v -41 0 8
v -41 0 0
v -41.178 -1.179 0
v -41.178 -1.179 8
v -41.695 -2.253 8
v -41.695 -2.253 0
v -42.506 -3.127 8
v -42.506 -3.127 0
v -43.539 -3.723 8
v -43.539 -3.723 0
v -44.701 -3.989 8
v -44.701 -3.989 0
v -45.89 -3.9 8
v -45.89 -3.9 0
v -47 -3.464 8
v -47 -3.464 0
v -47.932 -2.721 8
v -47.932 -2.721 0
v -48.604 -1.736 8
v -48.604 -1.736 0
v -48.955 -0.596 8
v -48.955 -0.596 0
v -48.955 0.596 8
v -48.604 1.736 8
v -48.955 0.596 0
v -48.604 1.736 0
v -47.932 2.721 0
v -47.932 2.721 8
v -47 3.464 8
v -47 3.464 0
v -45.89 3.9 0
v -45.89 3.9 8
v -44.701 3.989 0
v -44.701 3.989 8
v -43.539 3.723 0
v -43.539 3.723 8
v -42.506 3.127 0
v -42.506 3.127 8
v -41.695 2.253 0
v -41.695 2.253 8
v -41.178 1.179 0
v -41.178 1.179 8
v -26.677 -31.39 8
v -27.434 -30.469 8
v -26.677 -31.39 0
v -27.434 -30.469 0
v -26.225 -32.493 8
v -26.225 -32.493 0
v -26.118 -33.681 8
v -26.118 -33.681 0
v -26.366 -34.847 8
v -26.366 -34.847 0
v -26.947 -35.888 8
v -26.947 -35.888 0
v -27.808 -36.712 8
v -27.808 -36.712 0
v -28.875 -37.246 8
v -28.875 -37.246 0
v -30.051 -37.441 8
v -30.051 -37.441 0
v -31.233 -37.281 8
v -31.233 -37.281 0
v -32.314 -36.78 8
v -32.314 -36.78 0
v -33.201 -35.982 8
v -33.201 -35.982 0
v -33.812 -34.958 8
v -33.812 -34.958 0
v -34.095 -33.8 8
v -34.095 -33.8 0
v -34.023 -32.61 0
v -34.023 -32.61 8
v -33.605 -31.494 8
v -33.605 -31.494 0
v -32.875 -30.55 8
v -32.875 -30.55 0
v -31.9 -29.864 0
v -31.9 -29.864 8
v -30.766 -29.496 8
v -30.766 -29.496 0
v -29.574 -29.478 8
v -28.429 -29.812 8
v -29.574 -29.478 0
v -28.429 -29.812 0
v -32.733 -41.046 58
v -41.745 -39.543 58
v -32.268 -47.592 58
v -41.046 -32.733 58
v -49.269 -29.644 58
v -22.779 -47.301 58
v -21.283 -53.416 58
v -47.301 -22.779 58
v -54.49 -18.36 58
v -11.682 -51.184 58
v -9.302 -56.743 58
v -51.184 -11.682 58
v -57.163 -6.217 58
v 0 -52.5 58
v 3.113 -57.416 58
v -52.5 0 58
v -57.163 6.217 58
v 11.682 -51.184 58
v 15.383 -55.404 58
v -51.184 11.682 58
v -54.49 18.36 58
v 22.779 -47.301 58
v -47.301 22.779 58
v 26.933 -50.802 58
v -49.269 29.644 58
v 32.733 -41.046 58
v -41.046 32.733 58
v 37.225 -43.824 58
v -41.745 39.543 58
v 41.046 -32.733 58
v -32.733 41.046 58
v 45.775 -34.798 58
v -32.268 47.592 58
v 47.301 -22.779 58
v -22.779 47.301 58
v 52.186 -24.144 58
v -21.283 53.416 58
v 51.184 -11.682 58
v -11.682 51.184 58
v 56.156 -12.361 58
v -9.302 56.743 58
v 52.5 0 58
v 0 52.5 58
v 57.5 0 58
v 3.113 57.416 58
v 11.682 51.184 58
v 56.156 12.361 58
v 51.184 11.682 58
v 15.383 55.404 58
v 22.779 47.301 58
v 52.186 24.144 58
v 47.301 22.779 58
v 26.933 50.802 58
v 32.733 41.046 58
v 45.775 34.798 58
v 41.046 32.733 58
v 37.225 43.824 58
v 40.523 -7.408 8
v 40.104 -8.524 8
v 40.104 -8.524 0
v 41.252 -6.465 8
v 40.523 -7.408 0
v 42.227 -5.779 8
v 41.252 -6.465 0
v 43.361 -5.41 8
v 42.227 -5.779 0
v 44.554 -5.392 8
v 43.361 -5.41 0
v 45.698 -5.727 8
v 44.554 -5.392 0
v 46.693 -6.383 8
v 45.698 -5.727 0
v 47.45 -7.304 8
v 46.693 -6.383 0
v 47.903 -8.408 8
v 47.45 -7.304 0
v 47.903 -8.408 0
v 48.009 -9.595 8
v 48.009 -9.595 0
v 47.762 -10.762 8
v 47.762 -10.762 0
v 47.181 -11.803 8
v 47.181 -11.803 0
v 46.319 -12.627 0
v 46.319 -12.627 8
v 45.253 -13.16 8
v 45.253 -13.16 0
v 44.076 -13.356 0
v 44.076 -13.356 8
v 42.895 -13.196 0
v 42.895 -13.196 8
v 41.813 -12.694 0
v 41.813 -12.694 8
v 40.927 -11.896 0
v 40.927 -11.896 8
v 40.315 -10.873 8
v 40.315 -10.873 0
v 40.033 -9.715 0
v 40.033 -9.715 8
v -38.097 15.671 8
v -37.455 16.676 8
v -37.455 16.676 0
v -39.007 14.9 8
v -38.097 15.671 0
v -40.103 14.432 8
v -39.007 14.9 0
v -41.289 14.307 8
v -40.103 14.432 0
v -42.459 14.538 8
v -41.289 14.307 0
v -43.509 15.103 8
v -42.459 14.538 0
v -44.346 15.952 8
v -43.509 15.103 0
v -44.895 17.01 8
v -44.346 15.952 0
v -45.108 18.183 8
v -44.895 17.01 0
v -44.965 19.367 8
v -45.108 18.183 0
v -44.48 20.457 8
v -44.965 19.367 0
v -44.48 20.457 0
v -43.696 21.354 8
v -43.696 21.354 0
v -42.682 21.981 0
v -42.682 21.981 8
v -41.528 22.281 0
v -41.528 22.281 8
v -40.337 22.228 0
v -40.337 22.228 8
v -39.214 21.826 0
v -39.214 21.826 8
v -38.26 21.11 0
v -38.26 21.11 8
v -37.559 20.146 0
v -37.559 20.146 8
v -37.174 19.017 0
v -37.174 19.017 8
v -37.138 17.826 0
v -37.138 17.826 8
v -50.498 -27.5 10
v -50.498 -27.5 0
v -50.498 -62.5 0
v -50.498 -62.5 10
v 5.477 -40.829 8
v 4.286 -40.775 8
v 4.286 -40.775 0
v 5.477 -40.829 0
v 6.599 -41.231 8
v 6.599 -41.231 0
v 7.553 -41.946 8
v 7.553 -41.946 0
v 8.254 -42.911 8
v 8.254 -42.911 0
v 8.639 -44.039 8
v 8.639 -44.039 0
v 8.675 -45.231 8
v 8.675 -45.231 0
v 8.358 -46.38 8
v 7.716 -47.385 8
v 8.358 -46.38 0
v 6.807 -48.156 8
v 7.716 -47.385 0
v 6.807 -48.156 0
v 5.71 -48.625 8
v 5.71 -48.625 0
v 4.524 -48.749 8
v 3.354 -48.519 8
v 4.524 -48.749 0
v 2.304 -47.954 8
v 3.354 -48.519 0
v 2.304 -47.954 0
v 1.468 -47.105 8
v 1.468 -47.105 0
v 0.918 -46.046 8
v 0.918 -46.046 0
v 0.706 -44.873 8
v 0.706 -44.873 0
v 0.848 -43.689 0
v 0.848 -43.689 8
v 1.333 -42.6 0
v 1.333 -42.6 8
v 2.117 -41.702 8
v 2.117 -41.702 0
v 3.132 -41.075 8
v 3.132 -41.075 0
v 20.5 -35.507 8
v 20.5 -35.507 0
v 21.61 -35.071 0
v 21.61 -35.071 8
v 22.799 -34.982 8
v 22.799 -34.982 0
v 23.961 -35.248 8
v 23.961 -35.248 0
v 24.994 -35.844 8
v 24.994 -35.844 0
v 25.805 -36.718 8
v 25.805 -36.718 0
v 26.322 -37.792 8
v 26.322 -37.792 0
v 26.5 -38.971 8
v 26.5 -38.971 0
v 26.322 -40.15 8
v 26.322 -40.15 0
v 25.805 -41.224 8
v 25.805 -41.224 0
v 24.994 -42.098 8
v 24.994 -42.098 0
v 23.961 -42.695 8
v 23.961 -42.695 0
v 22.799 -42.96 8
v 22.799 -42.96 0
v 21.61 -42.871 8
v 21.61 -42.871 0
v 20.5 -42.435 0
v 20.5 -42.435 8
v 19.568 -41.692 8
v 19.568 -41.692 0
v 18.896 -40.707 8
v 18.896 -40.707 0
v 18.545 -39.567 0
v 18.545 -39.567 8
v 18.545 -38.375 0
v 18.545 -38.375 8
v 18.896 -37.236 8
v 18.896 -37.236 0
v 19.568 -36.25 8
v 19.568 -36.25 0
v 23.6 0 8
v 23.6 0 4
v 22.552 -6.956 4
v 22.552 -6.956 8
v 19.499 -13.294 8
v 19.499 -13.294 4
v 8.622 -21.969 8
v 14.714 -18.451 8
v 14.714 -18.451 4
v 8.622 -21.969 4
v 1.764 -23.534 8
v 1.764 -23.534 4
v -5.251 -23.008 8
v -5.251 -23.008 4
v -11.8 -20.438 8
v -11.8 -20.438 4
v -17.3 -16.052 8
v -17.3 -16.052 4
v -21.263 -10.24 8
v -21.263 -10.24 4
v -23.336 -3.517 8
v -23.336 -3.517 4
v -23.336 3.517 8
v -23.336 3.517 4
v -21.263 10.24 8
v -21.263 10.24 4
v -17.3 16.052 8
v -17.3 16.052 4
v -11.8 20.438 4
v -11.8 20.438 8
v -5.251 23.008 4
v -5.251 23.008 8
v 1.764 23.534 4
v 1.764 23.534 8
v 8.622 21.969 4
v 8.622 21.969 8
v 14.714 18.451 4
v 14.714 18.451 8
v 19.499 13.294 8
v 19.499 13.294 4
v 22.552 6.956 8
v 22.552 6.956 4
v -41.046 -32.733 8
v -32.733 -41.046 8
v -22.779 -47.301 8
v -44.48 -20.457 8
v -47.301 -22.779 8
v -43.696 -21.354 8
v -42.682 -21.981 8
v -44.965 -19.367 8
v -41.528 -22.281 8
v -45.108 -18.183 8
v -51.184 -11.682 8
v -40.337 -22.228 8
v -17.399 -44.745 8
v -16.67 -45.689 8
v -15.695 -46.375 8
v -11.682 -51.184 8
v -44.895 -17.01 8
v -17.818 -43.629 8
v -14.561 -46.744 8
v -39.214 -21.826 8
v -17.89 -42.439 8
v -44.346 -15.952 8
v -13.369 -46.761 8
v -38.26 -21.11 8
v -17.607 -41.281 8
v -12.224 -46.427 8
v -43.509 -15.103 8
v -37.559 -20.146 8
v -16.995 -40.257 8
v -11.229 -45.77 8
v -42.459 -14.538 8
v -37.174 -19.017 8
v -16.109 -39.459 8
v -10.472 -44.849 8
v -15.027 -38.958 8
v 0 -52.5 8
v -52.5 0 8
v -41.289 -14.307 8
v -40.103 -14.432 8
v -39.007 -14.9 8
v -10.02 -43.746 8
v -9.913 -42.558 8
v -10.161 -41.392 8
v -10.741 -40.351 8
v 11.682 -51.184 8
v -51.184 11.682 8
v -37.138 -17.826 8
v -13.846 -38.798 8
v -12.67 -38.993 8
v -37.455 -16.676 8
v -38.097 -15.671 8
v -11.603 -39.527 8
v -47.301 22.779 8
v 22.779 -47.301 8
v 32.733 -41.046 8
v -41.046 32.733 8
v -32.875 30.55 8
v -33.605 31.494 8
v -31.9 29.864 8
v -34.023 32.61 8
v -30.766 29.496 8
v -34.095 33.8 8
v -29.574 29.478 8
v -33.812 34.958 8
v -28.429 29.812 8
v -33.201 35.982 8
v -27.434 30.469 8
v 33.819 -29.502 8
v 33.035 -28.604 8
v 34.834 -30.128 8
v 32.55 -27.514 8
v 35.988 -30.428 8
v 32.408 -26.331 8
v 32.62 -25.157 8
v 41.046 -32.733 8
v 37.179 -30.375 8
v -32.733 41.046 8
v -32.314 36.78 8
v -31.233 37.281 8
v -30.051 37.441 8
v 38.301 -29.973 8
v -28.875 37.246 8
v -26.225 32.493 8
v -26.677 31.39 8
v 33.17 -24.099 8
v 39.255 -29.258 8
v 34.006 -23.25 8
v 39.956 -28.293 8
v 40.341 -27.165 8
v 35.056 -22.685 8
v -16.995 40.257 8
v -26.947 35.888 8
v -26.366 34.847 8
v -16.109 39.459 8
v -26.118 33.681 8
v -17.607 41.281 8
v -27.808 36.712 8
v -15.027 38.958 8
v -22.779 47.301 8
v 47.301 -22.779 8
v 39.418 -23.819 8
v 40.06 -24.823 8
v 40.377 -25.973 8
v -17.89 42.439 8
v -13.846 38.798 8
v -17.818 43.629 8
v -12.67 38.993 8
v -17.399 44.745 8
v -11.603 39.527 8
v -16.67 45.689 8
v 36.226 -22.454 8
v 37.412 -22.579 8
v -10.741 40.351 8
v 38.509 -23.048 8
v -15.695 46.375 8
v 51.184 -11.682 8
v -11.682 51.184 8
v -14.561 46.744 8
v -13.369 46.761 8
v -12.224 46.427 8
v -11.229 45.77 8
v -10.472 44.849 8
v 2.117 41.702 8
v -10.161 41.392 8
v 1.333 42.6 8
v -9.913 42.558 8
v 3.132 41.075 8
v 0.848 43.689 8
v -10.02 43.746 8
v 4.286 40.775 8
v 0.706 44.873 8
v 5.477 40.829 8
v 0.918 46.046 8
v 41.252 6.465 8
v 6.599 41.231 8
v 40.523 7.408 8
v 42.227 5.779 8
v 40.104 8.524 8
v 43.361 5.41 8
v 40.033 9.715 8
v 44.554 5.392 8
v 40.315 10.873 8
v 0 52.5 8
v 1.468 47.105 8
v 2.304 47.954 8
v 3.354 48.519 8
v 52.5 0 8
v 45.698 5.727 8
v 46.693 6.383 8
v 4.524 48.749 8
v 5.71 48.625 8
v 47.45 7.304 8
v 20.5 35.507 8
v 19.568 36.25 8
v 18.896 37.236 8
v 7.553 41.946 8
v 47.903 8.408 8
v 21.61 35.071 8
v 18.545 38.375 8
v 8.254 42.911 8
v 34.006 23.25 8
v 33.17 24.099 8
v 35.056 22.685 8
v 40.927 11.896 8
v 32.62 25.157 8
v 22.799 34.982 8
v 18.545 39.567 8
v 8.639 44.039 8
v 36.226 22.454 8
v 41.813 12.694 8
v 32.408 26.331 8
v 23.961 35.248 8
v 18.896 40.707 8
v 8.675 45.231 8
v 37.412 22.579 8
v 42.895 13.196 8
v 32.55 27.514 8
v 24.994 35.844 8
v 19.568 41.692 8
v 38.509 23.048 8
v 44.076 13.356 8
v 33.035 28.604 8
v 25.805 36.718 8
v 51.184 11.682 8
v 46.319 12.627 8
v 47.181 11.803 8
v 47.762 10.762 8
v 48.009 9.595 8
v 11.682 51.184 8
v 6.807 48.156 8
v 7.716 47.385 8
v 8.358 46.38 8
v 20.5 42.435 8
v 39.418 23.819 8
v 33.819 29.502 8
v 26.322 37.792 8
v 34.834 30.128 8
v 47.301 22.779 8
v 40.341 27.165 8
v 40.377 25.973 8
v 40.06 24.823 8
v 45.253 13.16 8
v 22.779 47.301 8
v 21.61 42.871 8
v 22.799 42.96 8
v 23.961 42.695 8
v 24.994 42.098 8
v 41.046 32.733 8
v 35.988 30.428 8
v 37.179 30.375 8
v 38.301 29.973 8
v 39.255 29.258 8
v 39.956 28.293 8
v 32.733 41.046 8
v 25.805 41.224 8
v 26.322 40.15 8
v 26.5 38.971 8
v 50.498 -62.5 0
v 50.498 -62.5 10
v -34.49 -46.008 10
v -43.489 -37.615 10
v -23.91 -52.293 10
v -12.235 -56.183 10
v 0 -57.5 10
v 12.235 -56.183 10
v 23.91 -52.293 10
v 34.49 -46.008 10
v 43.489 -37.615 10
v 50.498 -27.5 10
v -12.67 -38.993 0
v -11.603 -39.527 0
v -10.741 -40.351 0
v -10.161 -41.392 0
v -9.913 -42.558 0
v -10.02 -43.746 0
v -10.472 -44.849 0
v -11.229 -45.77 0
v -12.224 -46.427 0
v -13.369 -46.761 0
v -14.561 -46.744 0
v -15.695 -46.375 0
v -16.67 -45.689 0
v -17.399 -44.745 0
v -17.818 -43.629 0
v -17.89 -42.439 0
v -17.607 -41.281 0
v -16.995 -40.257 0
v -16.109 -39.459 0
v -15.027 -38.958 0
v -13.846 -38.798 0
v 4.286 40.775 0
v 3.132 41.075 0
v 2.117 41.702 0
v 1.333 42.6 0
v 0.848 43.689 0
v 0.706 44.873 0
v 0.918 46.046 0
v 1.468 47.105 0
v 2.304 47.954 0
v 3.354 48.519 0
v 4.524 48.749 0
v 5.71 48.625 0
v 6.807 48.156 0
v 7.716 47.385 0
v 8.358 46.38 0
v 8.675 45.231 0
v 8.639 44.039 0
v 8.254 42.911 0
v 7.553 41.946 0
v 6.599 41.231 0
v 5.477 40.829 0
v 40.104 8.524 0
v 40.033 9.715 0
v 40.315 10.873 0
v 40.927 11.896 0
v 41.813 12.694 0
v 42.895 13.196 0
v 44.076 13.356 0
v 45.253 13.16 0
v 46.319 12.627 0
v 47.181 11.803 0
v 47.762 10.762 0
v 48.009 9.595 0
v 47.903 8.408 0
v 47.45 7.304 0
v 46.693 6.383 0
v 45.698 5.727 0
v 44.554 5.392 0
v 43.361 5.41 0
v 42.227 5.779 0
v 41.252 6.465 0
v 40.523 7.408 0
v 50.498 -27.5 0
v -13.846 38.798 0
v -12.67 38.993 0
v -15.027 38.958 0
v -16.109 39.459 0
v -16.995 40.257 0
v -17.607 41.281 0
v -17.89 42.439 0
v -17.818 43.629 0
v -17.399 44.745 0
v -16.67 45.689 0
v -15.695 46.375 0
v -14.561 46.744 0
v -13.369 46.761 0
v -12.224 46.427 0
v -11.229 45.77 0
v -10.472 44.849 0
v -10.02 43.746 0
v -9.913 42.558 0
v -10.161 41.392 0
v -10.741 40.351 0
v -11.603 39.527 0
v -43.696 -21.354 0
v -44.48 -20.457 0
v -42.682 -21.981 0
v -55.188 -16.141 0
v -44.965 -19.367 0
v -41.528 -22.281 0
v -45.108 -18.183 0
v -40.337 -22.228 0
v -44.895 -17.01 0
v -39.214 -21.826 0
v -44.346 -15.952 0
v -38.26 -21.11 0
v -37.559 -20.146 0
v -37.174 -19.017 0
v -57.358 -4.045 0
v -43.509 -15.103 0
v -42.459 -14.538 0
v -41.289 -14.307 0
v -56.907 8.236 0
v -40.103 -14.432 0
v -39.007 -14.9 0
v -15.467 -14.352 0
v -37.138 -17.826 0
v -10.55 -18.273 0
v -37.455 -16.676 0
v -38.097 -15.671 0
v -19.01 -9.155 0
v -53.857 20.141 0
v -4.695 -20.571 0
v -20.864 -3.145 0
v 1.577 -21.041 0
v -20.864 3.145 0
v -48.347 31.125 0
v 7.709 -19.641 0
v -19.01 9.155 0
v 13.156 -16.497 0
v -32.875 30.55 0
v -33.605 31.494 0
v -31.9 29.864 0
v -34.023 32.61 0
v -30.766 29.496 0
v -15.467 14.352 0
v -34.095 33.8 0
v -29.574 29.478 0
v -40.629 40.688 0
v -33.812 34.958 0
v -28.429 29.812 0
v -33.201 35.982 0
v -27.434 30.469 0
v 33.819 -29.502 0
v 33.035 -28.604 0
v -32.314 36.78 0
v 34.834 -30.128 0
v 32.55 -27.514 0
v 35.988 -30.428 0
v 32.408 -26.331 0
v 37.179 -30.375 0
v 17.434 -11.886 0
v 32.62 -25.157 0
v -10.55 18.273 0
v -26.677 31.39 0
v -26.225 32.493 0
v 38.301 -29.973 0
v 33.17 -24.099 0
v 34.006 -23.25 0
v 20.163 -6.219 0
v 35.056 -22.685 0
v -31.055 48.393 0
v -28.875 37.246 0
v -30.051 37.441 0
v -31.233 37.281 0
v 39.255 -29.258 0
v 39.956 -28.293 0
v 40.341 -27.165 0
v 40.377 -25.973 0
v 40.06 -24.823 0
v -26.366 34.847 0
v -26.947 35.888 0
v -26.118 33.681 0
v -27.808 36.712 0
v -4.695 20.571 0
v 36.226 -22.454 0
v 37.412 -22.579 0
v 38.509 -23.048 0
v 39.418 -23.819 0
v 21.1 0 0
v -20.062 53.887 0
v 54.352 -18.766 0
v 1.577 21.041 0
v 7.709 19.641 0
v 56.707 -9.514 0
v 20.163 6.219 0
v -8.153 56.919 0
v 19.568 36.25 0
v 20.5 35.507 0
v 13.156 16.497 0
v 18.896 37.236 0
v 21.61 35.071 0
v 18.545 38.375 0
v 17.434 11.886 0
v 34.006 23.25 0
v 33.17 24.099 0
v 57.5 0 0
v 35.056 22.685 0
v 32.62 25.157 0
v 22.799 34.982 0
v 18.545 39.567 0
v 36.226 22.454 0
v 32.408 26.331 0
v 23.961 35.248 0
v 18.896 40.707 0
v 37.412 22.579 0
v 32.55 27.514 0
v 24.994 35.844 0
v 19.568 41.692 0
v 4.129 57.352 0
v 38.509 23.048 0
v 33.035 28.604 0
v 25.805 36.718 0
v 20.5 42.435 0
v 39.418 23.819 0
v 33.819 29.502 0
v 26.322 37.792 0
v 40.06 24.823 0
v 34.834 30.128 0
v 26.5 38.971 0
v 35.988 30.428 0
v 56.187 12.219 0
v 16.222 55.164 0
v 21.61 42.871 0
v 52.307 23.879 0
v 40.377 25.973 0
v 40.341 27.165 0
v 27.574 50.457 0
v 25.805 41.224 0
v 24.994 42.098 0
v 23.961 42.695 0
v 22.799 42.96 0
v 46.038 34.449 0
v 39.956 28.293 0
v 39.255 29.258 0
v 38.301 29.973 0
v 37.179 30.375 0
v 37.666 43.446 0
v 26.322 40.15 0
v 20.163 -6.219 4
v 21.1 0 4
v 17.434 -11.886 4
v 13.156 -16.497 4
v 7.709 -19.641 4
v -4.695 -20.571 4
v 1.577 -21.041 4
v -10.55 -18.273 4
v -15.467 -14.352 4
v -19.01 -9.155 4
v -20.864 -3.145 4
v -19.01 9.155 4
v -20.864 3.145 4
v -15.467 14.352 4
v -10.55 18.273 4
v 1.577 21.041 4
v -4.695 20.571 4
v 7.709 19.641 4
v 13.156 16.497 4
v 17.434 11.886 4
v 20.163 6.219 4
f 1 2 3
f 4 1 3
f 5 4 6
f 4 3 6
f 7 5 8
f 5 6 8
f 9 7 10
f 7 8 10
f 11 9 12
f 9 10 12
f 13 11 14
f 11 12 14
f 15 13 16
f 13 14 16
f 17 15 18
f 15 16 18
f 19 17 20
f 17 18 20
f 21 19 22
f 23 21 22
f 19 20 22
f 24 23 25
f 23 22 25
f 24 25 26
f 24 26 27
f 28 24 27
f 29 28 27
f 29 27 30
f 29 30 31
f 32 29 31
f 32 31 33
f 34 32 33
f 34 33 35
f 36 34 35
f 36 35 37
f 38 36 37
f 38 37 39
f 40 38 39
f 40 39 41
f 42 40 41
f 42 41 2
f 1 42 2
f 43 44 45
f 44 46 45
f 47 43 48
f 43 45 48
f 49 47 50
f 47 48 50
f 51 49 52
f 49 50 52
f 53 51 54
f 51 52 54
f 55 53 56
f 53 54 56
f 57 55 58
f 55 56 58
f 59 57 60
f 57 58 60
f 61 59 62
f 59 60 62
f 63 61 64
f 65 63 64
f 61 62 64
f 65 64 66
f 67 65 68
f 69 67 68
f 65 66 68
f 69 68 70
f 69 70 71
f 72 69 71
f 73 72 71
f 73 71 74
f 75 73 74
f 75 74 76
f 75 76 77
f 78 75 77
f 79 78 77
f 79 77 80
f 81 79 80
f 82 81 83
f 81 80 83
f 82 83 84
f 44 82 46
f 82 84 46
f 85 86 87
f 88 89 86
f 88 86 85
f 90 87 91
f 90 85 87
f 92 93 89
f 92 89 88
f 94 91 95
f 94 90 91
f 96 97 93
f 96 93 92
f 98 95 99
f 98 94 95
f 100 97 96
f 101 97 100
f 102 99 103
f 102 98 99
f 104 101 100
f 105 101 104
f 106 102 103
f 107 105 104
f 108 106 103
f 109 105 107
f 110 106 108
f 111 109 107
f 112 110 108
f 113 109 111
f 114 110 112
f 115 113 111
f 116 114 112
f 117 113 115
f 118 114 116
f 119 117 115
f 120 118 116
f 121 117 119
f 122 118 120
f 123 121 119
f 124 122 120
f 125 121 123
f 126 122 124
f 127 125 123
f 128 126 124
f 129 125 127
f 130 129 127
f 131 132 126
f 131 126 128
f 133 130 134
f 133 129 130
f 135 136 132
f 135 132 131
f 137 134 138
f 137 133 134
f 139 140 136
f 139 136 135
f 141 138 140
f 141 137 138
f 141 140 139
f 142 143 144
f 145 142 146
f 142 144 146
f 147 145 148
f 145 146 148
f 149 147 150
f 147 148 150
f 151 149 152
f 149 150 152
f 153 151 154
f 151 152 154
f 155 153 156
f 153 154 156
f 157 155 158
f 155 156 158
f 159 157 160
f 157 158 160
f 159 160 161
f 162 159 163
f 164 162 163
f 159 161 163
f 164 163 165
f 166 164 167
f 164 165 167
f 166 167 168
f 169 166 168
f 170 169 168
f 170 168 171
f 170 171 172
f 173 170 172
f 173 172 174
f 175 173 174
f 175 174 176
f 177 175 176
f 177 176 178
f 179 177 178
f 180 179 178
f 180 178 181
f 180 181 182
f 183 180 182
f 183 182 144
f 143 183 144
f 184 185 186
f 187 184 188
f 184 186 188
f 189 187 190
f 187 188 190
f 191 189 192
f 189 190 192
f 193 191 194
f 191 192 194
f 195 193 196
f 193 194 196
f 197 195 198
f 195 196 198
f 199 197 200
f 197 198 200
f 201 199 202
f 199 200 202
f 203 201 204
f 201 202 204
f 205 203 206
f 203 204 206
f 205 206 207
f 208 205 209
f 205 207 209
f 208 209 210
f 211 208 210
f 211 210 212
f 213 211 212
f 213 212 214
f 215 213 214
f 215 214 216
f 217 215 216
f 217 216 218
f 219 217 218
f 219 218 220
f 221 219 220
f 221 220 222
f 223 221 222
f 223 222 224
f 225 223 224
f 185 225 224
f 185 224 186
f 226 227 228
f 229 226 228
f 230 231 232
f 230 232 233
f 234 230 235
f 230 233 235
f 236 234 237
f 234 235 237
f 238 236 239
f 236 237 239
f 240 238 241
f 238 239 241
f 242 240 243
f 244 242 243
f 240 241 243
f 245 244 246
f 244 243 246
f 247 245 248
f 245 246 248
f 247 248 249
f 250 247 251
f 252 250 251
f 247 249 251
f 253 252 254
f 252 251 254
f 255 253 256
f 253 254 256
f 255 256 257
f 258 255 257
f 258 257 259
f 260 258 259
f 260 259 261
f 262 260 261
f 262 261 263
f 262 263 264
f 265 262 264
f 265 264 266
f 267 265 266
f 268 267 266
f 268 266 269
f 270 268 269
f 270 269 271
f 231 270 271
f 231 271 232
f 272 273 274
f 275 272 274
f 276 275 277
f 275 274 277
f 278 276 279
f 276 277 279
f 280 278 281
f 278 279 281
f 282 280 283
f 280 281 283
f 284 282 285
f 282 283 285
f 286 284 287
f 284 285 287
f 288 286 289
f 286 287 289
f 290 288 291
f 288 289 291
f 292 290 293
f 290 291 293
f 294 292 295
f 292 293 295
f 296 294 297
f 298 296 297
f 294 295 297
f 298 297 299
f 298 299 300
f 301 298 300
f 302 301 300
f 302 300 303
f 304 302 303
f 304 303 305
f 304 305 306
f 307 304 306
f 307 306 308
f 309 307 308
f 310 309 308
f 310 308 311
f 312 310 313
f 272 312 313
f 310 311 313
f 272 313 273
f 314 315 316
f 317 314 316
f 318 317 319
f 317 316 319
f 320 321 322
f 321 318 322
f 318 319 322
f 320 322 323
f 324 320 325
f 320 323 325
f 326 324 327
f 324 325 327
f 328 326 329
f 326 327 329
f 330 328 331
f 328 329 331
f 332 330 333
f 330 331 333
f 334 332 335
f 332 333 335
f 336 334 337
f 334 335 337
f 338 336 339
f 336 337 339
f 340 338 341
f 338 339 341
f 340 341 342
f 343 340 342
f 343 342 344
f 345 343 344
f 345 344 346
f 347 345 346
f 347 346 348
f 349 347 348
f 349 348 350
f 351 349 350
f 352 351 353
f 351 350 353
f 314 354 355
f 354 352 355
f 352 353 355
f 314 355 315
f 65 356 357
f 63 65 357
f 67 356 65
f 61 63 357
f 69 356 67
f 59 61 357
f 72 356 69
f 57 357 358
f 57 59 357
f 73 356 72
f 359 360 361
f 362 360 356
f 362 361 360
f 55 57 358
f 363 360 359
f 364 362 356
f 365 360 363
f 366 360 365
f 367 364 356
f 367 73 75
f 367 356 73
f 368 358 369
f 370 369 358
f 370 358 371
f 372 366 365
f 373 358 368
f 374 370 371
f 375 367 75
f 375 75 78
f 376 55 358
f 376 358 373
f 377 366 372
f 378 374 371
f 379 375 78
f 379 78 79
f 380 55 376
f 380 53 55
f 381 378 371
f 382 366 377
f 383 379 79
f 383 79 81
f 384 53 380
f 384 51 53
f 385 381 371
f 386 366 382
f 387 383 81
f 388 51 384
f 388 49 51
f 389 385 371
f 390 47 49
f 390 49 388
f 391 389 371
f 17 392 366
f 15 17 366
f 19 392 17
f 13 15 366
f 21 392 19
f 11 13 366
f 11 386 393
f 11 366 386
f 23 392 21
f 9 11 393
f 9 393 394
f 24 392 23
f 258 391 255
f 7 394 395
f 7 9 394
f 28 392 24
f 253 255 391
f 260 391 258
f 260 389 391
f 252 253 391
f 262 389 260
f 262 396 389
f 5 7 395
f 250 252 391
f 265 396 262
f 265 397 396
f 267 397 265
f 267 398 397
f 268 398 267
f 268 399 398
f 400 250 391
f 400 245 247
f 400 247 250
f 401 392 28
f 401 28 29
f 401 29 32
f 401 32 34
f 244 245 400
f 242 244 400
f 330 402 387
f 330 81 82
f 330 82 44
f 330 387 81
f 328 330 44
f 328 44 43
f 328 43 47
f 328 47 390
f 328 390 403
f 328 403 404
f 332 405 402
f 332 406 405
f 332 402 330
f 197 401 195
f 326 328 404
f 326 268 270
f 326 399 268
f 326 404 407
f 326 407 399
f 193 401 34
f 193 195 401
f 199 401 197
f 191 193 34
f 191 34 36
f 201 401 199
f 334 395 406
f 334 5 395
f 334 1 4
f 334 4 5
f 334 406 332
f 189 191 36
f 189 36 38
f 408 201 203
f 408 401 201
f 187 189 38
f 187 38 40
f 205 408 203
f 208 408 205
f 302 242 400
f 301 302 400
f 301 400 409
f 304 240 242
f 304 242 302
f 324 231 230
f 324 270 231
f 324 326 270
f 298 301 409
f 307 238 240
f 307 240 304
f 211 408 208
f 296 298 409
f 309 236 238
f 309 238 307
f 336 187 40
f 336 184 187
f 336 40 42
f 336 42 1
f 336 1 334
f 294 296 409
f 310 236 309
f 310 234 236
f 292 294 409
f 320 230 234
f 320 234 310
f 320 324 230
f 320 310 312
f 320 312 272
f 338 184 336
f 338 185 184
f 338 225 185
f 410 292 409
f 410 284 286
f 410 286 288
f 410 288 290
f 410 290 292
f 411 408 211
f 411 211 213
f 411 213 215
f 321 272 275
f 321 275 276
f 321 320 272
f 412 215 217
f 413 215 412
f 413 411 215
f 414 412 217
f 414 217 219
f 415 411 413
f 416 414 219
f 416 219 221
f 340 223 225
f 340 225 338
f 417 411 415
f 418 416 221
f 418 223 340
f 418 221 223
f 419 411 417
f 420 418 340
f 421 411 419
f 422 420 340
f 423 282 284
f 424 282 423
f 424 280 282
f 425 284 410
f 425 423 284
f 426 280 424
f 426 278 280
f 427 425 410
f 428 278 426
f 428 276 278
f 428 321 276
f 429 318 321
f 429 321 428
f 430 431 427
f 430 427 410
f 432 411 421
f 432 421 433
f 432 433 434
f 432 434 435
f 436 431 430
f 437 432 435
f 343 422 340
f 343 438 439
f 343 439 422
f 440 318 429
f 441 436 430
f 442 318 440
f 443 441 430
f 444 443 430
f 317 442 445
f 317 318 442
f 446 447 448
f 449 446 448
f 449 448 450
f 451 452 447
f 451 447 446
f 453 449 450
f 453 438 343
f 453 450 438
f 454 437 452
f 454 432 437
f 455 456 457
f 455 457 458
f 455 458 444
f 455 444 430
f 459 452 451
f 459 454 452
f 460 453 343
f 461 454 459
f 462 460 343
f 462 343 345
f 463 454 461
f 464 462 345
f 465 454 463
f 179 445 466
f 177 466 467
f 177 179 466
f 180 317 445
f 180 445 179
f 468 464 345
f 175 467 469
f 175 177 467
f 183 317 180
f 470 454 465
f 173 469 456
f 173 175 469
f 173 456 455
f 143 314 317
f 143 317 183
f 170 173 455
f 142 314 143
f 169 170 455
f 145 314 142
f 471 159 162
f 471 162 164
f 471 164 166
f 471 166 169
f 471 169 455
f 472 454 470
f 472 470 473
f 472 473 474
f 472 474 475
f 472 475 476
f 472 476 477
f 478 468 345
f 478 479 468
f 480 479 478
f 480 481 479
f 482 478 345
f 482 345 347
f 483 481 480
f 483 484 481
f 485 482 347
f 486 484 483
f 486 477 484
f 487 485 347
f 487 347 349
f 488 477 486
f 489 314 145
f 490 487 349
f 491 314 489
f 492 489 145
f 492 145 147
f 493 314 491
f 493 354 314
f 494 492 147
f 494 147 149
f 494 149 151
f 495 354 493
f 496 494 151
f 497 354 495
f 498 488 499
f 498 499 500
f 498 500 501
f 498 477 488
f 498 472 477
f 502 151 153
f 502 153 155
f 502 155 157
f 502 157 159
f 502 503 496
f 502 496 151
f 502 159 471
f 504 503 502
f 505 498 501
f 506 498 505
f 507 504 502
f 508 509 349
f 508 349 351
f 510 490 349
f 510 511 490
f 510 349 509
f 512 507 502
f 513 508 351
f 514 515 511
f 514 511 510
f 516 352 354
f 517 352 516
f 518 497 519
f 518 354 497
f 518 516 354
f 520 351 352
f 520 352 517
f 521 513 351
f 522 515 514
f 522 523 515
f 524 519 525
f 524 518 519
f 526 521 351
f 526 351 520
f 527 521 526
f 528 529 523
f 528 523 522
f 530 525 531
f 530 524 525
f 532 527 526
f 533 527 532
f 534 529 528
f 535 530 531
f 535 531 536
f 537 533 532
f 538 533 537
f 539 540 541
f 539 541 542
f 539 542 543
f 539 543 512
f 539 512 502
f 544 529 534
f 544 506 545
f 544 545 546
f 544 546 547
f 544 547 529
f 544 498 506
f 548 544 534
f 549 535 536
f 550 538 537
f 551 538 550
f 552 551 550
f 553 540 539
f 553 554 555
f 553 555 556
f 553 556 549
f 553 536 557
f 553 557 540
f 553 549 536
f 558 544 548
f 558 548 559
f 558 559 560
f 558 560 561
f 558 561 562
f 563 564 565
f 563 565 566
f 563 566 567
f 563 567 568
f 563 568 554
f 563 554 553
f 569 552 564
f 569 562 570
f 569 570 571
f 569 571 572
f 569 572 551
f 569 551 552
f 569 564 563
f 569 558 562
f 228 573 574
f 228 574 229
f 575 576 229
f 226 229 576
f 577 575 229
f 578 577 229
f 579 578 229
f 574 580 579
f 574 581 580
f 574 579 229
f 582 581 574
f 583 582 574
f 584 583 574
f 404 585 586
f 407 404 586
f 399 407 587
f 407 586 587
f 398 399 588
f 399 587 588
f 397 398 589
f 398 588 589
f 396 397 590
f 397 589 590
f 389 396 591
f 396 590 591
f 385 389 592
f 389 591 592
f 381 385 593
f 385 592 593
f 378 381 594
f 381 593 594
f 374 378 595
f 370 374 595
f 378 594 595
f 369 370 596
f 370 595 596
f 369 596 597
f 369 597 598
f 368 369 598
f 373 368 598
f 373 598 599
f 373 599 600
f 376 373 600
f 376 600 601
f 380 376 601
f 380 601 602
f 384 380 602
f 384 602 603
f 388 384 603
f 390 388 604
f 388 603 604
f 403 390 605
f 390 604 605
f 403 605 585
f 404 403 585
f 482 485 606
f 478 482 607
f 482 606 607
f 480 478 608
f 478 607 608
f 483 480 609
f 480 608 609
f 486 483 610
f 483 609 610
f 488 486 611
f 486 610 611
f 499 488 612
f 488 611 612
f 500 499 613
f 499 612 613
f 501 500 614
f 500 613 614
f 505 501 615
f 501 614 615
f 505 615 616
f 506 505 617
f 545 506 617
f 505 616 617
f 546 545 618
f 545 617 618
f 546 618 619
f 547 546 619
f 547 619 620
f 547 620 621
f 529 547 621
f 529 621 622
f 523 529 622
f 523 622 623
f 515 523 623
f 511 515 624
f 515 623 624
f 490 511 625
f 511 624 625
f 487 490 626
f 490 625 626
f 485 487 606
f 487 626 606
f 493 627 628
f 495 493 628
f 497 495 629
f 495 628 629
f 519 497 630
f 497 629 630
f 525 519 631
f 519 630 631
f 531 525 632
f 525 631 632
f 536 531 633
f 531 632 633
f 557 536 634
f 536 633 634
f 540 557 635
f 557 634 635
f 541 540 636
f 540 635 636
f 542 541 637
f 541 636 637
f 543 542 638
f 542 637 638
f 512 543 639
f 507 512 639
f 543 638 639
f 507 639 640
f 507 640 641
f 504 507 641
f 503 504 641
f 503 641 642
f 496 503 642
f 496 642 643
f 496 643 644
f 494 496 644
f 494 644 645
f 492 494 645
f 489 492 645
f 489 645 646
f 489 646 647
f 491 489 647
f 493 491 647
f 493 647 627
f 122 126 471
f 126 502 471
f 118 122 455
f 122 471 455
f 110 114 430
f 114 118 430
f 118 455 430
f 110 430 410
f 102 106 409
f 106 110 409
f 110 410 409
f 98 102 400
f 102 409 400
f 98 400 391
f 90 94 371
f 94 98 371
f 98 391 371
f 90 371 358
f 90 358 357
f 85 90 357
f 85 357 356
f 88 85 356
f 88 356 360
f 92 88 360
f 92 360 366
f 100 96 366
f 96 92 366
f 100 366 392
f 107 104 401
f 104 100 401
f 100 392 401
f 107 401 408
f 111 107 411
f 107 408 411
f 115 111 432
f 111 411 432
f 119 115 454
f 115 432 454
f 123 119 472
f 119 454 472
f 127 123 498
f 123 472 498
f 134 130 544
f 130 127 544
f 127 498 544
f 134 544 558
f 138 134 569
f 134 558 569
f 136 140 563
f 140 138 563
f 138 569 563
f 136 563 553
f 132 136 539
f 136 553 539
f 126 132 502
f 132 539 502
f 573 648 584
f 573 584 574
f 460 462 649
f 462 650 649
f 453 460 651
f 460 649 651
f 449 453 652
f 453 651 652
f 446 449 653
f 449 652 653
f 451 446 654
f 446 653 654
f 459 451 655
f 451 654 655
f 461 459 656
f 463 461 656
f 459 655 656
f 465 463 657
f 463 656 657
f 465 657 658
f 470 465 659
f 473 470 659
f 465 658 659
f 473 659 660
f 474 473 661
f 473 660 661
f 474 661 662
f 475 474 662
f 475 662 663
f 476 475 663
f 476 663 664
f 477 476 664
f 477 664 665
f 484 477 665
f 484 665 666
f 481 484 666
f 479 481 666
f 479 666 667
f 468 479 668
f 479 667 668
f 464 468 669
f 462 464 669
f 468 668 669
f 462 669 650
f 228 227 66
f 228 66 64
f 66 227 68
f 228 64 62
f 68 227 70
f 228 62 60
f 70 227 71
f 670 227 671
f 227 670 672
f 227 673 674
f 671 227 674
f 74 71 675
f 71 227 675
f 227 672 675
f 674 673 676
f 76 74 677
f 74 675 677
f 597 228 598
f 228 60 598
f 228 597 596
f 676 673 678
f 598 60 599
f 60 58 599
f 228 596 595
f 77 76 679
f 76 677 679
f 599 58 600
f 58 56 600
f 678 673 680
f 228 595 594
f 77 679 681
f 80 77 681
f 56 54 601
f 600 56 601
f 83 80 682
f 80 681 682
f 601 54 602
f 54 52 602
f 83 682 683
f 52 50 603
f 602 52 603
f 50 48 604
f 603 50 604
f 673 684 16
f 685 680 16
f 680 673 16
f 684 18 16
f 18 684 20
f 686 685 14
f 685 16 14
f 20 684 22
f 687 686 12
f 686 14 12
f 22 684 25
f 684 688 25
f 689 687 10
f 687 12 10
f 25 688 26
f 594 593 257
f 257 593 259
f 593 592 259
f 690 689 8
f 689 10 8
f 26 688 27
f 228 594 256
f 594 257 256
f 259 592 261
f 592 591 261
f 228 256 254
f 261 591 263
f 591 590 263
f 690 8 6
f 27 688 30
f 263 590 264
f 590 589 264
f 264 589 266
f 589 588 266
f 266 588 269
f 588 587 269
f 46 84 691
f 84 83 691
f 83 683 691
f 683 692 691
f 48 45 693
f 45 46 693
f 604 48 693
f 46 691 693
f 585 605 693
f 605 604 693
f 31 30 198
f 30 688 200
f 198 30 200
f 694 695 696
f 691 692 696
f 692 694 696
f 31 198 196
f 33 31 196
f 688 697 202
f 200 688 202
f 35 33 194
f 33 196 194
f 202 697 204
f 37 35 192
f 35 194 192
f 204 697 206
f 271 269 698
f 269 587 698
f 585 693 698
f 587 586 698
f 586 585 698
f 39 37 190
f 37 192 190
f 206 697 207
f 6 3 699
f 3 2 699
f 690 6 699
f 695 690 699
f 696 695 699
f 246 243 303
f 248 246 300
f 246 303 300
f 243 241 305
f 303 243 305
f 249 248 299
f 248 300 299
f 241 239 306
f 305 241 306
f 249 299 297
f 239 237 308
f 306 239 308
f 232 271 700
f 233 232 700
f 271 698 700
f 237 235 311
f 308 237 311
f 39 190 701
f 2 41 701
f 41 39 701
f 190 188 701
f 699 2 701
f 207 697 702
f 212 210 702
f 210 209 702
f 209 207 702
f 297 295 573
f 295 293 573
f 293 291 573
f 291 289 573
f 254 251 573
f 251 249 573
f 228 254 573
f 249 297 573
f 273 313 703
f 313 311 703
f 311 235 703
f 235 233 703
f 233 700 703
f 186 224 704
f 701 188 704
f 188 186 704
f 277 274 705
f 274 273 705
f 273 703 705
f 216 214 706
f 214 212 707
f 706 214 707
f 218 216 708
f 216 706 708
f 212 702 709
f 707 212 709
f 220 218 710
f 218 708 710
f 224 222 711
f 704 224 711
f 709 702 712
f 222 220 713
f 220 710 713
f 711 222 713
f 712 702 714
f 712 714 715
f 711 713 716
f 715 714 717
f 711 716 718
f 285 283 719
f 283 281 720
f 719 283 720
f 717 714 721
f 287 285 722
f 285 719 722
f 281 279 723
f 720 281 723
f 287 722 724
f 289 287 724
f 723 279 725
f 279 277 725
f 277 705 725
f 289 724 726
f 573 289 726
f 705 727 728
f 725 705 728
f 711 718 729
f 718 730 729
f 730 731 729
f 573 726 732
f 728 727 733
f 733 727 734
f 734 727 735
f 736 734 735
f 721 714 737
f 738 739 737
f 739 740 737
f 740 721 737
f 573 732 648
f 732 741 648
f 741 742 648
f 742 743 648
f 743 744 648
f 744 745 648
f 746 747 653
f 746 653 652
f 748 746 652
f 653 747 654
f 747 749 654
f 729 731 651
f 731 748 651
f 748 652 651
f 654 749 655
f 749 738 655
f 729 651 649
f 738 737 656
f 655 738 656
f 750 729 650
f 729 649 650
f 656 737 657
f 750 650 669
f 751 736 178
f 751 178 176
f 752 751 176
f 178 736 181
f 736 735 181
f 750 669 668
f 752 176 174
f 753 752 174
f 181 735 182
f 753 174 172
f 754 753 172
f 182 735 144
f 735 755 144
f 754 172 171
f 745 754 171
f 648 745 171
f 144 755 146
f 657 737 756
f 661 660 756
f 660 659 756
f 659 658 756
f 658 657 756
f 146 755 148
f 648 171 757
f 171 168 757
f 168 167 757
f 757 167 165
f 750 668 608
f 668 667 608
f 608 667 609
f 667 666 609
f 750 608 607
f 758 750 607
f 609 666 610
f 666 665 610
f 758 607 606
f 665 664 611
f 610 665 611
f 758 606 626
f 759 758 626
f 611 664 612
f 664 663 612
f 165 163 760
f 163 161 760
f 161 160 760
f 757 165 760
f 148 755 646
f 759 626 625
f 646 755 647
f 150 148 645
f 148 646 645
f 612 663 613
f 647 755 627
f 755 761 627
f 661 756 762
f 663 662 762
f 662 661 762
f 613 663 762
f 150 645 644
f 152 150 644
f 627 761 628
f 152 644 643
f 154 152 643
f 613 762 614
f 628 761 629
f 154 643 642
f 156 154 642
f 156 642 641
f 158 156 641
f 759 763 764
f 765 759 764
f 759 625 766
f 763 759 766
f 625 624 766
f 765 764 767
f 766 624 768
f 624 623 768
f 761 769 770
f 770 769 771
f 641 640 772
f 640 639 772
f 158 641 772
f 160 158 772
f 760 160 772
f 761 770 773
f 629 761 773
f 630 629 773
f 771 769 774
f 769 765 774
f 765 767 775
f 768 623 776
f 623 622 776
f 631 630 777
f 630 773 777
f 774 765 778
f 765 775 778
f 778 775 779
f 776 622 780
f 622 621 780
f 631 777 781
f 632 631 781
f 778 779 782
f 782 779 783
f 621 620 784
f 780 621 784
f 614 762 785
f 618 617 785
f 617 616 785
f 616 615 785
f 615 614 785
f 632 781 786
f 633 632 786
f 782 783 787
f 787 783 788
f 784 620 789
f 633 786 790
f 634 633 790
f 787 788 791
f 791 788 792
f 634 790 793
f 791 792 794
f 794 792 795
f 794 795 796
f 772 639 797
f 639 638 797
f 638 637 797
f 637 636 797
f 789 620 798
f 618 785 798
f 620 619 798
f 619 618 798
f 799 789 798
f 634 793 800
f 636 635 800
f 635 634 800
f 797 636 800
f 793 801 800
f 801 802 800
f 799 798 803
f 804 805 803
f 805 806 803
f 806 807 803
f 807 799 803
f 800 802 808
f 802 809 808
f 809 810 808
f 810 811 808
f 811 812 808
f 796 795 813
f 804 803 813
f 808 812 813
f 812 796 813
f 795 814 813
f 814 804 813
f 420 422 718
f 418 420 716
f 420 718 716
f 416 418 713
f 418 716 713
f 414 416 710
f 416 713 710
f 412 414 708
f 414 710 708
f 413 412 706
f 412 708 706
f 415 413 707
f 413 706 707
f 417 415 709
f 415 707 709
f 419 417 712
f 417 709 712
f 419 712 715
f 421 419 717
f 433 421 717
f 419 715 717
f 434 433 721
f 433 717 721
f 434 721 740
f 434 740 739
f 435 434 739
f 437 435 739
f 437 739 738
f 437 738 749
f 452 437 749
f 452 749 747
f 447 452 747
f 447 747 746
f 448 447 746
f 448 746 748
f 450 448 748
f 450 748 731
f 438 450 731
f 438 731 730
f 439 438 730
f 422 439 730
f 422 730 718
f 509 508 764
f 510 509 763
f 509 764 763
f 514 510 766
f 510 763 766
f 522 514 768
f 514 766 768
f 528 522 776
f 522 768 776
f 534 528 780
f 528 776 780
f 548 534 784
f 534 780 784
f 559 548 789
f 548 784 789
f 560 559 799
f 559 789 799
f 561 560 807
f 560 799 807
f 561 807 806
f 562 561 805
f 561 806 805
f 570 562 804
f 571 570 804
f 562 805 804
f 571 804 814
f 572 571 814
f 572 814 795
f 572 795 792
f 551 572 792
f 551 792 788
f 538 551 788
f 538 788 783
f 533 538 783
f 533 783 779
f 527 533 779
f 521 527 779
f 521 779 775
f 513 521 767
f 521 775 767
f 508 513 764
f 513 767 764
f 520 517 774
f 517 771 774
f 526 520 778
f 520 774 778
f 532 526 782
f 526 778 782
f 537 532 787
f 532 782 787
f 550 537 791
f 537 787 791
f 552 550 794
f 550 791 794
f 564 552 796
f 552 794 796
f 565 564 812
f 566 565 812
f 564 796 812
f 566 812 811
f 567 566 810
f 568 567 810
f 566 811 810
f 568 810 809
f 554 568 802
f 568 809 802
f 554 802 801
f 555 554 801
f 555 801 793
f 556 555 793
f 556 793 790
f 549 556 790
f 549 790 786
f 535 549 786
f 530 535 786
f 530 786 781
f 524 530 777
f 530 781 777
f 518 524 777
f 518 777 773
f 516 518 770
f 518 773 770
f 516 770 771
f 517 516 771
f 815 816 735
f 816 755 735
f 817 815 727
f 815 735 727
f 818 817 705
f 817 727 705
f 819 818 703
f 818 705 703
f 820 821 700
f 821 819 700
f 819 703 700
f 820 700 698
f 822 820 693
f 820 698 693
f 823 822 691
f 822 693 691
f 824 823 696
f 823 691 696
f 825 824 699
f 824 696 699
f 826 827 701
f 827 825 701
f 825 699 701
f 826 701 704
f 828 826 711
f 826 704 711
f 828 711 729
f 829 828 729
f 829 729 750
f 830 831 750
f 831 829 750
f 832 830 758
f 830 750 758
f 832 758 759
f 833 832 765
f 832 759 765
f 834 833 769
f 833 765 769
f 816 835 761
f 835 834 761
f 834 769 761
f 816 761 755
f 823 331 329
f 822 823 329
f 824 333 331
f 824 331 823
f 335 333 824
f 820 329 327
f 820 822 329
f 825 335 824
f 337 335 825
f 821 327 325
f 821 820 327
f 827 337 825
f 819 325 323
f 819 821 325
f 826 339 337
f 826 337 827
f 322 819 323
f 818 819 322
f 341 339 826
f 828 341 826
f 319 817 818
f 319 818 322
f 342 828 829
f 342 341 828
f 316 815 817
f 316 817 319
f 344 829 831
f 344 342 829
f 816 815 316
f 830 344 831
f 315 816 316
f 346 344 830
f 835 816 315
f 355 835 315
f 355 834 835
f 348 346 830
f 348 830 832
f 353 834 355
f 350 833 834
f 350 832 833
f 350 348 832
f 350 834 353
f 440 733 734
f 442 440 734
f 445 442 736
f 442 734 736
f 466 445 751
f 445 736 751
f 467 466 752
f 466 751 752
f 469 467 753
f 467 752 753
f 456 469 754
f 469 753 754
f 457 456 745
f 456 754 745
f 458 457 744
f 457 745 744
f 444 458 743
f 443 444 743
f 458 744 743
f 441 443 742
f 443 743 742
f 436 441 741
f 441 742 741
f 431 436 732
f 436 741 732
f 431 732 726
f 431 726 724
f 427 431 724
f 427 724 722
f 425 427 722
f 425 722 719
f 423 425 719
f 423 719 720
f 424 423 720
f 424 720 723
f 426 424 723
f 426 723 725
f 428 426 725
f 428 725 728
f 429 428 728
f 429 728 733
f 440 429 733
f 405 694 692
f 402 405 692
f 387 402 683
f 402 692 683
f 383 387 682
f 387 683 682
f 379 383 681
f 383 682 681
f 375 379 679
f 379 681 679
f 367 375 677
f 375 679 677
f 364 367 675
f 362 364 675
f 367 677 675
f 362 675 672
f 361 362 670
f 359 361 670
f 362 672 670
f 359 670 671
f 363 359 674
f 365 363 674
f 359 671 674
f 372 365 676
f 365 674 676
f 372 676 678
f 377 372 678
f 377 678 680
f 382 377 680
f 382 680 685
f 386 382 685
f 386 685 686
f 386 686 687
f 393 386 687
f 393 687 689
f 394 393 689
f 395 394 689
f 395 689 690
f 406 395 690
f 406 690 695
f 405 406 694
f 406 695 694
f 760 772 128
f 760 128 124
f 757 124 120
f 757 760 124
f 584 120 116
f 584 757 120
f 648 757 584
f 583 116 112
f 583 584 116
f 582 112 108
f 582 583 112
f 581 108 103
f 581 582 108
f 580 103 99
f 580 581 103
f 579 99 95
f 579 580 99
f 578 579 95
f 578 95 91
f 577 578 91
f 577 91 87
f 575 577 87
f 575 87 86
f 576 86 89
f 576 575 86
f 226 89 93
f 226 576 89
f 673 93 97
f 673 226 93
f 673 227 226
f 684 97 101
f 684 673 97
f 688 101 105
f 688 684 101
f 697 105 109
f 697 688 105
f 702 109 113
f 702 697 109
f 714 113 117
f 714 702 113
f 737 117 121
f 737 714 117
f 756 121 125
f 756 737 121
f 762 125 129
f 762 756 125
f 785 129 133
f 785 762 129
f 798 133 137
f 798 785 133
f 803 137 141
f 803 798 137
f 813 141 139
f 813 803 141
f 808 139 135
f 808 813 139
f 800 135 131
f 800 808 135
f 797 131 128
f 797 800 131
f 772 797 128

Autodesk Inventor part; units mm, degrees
ref_plane "YZ Plane" through (0, 0, 0) normal (1, 0, 0) x (0, 1, 0)
ref_plane "XZ Plane" through (0, 0, 0) normal (0, 1, 0) x (-1, 0, 0)
ref_plane "XY Plane" through (0, 0, 0) normal (0, 0, 1) x (1, 0, 0)
sketch "Sketch1" plane through (0, 0, 0) normal (0, 0, 1) x (1, 0, 0)
  circle A0 centre (0, 0) radius 52.5
  circle A1 centre (0, 0) radius 57.5
  circle A2 centre (0, 0) radius 23.6
  circle A3 centre (0, 0) radius 21.1
  circle A4 centre (0, 0) radius 45 construction
  line L0 (50.4975, -27.5) -> (50.4975, -62.5)
  line L1 (-50.4975, -27.5) -> (-50.4975, -62.5)
  line L2 (50.4975, -62.5) -> (-50.4975, -62.5)
  line L3 (20.0155, -57.5) -> (-14.9845, -57.5) construction
  circle A5 centre (-45, 0) radius 4
  dimension "d11" = 90
  dimension "d0" = 105
  dimension "d1" = 5
  dimension "d2" = 47.2
  dimension "d3" = 2.5
  dimension "d17" = 35
  dimension "d18" = 35
  dimension "d19" = 5
  dimension "d22" = 8
extrude "Extrusion1" add sketch "Sketch1" along normal blind 4 contours A2
extrude "Extrusion2" add sketch "Sketch1" along normal blind 8 contours A0 | A5
extrude "Extrusion3" add sketch "Sketch1" along normal blind 58 contours A1
extrude "Extrusion4" cut sketch "Sketch1" along normal blind 15 contours A5
extrude "Extrusion5" add sketch "Sketch1" along normal blind 10 contours A1 L0 L2 L1
pattern_circular "Circular Pattern2" count 15 over 360 about axis through (0, 0, 0) along (0, 0, 1) of "Extrusion4"
properties part number "Main Housing"
